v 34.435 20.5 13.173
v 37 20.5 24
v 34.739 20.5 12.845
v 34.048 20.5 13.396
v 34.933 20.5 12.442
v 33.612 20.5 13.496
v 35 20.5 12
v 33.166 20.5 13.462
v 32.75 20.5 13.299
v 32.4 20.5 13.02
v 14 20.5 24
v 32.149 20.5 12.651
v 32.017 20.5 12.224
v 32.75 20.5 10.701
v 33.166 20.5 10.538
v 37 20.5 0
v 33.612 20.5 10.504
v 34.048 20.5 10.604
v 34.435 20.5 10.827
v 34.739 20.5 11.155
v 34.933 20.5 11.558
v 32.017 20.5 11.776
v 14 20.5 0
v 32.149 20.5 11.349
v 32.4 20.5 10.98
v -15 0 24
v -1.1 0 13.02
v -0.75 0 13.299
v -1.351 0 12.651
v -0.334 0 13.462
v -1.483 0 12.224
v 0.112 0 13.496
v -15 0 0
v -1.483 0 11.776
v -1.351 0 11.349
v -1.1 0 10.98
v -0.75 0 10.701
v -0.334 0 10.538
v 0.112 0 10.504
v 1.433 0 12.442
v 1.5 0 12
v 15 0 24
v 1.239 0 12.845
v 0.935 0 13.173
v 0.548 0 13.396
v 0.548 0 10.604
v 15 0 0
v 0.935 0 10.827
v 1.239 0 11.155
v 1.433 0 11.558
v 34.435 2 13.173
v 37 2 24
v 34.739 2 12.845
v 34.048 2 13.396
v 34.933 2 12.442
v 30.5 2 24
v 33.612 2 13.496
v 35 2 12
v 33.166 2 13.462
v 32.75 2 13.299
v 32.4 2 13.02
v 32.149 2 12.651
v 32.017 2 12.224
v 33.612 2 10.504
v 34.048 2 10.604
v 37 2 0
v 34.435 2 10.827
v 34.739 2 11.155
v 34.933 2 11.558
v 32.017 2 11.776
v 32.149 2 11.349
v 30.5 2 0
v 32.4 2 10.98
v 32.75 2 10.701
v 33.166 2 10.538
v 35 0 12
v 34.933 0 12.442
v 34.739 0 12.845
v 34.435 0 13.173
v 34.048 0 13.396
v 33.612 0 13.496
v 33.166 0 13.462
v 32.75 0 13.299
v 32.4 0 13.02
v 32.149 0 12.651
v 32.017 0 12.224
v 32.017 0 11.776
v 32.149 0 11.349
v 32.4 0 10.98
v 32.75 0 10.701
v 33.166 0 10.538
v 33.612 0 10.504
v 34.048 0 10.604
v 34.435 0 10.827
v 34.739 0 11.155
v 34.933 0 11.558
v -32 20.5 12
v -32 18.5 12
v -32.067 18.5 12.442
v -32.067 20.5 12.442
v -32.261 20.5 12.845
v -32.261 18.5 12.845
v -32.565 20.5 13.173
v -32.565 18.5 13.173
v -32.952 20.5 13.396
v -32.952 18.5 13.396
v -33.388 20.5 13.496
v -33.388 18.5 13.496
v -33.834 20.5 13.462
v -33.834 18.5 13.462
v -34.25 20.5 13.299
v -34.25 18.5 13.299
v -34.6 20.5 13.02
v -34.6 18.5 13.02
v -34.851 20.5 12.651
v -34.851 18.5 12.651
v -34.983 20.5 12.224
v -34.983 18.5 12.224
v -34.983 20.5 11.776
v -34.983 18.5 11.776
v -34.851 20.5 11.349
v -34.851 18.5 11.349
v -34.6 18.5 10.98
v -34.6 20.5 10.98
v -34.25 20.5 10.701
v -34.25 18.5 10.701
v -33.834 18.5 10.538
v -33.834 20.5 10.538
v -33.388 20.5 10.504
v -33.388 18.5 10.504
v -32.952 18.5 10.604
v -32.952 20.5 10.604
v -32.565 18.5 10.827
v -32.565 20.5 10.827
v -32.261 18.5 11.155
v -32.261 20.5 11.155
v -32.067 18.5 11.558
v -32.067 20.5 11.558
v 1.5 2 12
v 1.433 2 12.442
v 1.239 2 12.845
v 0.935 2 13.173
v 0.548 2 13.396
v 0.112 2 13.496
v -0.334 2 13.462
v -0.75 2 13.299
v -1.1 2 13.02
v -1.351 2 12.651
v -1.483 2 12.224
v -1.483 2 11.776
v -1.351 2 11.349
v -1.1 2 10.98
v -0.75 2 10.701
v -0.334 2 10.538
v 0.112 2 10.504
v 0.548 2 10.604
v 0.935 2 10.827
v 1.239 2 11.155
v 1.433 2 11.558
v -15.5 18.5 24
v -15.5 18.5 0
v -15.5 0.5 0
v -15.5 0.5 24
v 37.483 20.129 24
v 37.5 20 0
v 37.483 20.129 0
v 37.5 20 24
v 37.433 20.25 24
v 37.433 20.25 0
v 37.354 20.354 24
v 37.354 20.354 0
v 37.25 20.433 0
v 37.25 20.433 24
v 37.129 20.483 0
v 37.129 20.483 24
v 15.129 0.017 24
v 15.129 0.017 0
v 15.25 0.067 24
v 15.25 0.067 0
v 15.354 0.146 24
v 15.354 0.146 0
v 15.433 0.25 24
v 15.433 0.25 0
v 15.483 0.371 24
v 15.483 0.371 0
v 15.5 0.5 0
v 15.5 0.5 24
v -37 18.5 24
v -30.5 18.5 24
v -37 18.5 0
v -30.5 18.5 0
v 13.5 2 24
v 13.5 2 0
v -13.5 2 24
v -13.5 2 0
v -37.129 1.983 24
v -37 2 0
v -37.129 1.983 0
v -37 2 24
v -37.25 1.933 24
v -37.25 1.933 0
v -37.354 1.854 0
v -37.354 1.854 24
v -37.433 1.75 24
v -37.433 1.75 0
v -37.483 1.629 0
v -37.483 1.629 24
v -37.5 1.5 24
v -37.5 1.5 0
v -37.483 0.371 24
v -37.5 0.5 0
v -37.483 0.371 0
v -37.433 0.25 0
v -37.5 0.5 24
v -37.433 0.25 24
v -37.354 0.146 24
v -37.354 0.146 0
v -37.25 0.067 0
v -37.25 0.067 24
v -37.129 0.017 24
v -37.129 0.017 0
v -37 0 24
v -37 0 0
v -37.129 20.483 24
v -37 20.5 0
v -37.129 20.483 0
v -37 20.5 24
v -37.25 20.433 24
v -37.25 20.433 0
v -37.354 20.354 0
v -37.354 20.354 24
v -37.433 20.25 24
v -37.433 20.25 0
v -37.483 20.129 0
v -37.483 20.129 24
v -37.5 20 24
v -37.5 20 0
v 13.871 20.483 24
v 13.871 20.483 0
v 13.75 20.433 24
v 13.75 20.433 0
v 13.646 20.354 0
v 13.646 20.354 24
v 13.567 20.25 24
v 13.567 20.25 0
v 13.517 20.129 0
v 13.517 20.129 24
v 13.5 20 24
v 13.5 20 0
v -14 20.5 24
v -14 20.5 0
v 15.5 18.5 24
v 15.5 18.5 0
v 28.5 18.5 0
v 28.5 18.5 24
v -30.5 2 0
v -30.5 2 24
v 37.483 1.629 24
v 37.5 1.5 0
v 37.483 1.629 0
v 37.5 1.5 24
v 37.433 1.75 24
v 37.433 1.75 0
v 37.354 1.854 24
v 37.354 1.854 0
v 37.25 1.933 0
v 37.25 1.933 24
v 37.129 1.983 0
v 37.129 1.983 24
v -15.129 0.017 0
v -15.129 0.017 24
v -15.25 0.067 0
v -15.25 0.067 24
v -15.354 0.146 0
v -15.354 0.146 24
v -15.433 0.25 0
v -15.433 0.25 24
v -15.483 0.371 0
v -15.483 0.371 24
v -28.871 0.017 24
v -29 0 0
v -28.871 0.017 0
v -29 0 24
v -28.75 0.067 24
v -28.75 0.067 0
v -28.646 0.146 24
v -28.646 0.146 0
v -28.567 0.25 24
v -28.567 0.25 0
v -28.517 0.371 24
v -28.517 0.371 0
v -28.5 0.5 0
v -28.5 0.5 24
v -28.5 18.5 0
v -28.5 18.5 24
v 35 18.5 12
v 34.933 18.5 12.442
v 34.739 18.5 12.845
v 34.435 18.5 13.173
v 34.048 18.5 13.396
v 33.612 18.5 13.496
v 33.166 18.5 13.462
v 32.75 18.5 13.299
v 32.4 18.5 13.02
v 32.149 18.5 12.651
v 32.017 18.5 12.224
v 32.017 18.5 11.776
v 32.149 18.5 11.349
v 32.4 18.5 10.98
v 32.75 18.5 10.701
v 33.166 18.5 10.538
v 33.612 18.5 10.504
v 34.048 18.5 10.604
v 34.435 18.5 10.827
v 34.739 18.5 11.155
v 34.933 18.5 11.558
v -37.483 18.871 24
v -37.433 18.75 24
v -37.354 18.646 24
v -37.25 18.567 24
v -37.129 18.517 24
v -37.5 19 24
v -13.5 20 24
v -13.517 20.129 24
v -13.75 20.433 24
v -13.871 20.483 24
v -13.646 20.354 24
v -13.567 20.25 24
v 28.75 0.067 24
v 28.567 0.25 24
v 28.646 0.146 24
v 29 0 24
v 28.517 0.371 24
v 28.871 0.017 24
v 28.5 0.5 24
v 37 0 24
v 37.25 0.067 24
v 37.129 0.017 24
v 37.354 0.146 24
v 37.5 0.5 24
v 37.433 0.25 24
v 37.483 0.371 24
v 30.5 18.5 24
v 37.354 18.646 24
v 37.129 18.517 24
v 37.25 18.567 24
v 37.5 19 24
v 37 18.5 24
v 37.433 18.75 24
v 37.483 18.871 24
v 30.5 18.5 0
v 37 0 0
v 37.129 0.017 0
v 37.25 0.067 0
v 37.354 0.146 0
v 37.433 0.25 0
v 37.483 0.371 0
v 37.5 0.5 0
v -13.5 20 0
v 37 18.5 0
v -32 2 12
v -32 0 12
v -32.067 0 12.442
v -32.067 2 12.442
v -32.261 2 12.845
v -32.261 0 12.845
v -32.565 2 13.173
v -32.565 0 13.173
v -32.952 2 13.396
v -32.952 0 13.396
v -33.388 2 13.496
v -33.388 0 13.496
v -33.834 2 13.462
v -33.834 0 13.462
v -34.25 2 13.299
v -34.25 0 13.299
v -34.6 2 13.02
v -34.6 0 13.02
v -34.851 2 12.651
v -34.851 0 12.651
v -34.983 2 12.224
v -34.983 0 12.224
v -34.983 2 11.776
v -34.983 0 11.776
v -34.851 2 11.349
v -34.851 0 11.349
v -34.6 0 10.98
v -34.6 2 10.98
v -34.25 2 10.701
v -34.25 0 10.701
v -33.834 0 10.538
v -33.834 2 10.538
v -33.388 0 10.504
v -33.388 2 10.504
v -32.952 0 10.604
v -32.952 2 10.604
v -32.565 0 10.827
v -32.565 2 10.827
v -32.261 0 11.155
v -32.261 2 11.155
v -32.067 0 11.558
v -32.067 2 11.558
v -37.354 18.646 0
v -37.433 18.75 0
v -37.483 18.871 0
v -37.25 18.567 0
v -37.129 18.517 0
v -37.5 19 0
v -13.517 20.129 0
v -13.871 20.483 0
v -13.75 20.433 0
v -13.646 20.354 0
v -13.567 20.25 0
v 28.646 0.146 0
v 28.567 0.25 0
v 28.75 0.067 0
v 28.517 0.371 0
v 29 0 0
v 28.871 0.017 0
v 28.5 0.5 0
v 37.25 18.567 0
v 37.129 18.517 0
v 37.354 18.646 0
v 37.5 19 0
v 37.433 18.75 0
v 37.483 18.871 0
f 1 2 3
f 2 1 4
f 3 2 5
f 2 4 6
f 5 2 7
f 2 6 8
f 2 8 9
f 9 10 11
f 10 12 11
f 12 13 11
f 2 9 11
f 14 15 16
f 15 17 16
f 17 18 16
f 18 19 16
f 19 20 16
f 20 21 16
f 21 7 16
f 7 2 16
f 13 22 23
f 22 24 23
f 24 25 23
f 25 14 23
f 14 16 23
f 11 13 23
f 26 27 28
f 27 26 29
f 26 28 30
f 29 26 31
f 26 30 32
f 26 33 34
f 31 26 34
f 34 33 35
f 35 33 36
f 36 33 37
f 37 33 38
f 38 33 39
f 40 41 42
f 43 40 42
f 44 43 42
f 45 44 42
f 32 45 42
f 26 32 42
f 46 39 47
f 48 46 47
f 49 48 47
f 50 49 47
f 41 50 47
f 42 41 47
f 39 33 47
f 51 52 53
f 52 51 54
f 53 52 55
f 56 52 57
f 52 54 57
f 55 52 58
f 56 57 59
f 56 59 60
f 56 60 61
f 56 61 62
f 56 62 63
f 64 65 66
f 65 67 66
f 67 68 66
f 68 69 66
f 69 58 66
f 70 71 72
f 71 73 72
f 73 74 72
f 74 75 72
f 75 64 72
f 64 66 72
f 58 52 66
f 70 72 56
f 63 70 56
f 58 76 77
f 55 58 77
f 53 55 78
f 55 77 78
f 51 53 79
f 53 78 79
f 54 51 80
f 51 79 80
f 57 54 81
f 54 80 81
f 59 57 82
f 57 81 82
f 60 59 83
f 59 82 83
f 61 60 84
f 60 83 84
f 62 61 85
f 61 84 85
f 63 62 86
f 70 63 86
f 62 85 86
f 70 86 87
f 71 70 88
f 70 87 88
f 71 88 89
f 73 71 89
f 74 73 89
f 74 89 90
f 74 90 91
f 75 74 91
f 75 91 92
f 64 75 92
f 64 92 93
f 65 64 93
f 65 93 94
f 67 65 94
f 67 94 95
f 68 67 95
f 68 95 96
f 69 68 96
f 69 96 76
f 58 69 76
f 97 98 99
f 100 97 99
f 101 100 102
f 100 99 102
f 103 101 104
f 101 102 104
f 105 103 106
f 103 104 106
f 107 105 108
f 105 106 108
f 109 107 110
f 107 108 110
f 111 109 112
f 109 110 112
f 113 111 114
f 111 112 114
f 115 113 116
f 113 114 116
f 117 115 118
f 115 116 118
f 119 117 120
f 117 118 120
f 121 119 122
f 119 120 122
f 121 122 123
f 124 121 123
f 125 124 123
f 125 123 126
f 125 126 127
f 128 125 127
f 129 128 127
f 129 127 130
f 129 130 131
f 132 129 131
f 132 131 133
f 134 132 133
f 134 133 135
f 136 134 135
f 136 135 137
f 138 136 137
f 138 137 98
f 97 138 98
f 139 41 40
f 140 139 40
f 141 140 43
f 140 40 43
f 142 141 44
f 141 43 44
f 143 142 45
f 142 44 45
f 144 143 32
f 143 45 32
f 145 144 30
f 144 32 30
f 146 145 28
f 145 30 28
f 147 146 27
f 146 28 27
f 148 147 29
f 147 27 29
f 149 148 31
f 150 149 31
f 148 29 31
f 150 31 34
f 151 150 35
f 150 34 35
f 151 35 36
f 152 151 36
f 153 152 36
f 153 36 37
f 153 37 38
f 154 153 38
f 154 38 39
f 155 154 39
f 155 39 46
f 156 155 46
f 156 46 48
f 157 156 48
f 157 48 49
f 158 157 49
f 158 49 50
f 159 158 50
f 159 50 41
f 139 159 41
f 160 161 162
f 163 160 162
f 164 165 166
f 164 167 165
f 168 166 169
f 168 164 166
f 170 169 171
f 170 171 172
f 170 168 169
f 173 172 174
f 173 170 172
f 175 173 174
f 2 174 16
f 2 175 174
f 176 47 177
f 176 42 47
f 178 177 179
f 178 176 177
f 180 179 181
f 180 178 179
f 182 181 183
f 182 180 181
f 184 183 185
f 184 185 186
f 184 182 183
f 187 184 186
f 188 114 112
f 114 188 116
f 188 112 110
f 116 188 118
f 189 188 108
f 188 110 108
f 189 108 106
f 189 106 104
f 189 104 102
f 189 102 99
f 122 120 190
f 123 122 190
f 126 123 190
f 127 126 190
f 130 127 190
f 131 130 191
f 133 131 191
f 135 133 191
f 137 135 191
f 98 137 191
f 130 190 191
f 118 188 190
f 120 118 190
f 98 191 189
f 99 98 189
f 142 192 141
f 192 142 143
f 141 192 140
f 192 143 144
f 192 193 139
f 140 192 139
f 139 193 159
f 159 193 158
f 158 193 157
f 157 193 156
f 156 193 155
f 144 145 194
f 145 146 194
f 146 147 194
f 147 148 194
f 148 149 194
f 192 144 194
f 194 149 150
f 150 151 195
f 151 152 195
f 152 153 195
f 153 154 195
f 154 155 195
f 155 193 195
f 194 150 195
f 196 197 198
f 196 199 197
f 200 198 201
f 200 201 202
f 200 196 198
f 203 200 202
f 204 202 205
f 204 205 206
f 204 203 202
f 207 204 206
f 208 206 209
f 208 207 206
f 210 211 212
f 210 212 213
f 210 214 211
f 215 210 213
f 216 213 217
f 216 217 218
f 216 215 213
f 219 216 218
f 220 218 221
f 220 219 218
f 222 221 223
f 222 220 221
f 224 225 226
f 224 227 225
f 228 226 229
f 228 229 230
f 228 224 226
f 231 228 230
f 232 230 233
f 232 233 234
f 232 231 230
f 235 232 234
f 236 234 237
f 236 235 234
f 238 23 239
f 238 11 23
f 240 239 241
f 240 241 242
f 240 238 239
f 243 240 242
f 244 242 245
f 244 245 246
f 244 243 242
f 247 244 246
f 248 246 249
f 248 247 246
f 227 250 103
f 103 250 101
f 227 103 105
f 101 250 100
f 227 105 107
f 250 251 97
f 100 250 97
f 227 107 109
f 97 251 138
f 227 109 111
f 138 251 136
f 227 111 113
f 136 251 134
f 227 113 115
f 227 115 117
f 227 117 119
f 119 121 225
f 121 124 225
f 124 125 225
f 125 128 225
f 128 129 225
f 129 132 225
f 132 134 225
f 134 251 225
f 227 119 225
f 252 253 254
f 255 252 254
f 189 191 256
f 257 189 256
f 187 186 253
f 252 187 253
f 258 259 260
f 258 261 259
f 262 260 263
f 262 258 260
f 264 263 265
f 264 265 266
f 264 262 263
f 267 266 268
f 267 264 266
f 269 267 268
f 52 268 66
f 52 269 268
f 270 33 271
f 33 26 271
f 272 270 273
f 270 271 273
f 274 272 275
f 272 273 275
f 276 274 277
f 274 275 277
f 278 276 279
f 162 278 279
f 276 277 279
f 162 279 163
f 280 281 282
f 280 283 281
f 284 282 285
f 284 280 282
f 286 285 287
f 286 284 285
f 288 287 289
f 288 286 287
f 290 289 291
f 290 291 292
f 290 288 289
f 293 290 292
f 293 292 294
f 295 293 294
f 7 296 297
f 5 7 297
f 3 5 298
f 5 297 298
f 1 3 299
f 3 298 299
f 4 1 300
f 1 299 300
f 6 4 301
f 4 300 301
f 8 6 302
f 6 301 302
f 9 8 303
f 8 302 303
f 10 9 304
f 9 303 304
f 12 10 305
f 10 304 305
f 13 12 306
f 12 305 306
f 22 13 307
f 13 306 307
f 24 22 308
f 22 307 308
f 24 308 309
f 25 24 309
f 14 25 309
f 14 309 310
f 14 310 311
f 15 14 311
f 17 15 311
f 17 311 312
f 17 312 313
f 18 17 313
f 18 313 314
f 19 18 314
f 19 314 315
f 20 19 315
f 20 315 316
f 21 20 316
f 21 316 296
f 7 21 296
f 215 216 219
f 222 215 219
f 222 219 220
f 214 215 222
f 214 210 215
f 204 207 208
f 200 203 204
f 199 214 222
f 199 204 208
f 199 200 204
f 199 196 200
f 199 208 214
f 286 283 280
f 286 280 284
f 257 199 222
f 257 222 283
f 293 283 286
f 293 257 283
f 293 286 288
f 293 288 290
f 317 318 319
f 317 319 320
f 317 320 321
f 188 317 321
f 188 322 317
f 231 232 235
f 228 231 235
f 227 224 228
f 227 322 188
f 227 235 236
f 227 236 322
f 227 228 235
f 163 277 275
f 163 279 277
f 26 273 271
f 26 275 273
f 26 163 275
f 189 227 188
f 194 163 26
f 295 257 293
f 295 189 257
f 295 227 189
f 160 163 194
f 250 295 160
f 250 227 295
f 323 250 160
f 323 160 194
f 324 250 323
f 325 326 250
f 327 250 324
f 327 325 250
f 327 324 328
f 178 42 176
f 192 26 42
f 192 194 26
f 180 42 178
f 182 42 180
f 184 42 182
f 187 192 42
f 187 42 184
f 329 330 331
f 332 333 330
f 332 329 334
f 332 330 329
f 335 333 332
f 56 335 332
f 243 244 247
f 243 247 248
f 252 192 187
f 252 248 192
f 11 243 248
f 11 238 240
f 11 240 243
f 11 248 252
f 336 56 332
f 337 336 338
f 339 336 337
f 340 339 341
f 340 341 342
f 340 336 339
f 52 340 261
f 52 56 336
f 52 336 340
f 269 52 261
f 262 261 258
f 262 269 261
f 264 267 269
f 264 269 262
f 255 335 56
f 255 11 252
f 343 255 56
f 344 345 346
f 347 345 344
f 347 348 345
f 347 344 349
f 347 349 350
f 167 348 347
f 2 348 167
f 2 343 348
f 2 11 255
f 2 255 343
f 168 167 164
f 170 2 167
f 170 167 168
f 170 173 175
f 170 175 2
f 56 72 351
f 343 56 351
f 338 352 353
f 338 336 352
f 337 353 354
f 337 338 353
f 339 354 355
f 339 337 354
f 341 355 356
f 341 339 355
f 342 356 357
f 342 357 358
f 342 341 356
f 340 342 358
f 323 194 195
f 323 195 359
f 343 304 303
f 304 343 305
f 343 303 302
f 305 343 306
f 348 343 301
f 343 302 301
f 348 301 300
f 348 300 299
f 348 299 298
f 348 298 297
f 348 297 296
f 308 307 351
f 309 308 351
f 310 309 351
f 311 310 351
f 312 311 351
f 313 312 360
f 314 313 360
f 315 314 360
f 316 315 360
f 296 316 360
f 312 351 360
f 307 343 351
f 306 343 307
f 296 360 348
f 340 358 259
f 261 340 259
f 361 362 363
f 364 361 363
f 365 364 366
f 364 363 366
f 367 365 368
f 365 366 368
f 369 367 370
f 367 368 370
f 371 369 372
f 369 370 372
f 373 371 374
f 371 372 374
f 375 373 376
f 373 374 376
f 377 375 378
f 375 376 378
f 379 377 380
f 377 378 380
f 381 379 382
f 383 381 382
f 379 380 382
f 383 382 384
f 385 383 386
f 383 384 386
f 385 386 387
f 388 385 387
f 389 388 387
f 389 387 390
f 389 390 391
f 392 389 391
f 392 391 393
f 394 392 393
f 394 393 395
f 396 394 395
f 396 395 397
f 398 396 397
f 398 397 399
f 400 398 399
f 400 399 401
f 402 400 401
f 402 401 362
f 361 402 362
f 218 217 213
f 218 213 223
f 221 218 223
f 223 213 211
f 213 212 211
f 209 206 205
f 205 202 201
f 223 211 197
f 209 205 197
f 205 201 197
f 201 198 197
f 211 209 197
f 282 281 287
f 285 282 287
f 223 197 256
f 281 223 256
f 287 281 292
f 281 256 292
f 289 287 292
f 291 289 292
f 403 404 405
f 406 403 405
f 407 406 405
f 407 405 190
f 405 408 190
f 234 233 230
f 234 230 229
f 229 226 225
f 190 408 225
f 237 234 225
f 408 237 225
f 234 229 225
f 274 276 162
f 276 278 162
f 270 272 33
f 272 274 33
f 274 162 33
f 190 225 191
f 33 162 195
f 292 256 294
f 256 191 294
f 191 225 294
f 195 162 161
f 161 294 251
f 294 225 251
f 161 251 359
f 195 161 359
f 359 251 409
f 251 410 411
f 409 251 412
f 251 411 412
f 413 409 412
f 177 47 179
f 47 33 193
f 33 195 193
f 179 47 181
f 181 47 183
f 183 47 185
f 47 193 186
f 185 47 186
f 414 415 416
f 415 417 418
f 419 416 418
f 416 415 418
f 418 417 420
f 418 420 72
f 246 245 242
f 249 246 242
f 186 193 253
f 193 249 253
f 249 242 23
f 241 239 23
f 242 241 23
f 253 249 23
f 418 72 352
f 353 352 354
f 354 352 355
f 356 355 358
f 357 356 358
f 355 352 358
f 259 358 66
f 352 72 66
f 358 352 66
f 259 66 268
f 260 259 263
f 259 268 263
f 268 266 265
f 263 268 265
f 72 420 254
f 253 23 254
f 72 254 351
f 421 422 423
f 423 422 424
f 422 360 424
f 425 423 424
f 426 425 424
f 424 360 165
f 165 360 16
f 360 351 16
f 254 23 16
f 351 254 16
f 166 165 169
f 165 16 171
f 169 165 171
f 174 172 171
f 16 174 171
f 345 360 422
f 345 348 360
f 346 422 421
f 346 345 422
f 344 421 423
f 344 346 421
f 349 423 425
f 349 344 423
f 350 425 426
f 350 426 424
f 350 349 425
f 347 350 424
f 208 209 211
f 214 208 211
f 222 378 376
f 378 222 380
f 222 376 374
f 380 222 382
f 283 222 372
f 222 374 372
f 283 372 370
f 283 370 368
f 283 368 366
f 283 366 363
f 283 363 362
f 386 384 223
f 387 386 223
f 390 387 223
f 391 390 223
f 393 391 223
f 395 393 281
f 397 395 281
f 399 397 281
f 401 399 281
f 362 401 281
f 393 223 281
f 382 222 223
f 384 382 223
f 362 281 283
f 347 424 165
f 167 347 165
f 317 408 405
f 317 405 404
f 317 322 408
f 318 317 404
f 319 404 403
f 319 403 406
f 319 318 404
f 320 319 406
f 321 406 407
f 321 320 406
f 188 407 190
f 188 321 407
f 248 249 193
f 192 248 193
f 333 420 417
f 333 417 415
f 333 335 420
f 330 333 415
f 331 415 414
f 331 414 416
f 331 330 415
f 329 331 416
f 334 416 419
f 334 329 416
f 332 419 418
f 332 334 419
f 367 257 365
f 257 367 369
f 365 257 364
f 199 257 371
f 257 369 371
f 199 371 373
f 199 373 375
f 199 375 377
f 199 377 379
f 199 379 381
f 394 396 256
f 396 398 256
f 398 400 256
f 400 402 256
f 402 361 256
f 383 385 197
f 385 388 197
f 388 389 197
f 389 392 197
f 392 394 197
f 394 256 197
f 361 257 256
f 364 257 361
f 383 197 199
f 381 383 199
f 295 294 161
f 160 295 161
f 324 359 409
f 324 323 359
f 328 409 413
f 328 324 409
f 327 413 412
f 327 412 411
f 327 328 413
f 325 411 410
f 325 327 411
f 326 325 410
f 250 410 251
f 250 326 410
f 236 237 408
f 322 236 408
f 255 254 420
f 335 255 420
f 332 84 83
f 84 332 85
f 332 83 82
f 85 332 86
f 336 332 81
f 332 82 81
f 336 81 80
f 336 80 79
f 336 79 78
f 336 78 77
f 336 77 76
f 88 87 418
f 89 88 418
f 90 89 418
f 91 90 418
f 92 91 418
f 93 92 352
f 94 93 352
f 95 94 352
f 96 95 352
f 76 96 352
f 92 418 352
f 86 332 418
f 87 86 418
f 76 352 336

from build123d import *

# Parameters (mm, degrees)
F1_DEPTH = 24
F2_R     = 1.5
F3_DEPTH = 25
F4_R     = 0.5


with BuildPart() as f1:
    # F0 (on Top) → F1 (new body)
    with BuildSketch(Plane.XY):
        Polygon((-15.5, 0), (0, 0), (15.5, 0), (15.5, 18.5), (28.5, 18.5), (28.5, 0), (37.5, 0), (37.5, 2), (30.5, 2), (30.5, 18.5), (37.5, 18.5), (37.5, 20.5), (13.5, 20.5), (13.5, 2), (0, 2), (-13.5, 2), (-13.5, 20.5), (-37.5, 20.5), (-37.5, 18.5), (-30.5, 18.5), (-30.5, 2), (-37.5, 2), (-37.5, 0), (-28.5, 0), (-28.5, 18.5), (-15.5, 18.5), align=None)
    extrude(amount=F1_DEPTH)

    # F2 (on face) → F3 (cut)
    with BuildSketch(Plane.XZ):
        with Locations((-33.5, 12)):
            Circle(F2_R)
        with Locations((0, 12)):
            Circle(F2_R)
        with Locations((33.5, 12)):
            Circle(F2_R)
    extrude(amount=-F3_DEPTH, mode=Mode.SUBTRACT)

    # F4
    f4_edges = [f1.edges().sort_by_distance(p)[0] for p in [
        (-13.5, 20.5, 12),
        (13.5, 20.5, 12),
        (15.5, 0, 12),
        (-28.5, 0, 12),
        (-15.5, 0, 12),
        (28.5, 0, 12),
        (37.5, 20.5, 12),
        (37.5, 18.5, 12),
        (37.5, 2, 12),
        (37.5, 0, 12),
        (-37.5, 20.5, 12),
        (-37.5, 18.5, 12),
        (-37.5, 2, 12),
        (-37.5, 0, 12),
    ]]
    fillet(f4_edges, radius=F4_R)


solid = f1.part
